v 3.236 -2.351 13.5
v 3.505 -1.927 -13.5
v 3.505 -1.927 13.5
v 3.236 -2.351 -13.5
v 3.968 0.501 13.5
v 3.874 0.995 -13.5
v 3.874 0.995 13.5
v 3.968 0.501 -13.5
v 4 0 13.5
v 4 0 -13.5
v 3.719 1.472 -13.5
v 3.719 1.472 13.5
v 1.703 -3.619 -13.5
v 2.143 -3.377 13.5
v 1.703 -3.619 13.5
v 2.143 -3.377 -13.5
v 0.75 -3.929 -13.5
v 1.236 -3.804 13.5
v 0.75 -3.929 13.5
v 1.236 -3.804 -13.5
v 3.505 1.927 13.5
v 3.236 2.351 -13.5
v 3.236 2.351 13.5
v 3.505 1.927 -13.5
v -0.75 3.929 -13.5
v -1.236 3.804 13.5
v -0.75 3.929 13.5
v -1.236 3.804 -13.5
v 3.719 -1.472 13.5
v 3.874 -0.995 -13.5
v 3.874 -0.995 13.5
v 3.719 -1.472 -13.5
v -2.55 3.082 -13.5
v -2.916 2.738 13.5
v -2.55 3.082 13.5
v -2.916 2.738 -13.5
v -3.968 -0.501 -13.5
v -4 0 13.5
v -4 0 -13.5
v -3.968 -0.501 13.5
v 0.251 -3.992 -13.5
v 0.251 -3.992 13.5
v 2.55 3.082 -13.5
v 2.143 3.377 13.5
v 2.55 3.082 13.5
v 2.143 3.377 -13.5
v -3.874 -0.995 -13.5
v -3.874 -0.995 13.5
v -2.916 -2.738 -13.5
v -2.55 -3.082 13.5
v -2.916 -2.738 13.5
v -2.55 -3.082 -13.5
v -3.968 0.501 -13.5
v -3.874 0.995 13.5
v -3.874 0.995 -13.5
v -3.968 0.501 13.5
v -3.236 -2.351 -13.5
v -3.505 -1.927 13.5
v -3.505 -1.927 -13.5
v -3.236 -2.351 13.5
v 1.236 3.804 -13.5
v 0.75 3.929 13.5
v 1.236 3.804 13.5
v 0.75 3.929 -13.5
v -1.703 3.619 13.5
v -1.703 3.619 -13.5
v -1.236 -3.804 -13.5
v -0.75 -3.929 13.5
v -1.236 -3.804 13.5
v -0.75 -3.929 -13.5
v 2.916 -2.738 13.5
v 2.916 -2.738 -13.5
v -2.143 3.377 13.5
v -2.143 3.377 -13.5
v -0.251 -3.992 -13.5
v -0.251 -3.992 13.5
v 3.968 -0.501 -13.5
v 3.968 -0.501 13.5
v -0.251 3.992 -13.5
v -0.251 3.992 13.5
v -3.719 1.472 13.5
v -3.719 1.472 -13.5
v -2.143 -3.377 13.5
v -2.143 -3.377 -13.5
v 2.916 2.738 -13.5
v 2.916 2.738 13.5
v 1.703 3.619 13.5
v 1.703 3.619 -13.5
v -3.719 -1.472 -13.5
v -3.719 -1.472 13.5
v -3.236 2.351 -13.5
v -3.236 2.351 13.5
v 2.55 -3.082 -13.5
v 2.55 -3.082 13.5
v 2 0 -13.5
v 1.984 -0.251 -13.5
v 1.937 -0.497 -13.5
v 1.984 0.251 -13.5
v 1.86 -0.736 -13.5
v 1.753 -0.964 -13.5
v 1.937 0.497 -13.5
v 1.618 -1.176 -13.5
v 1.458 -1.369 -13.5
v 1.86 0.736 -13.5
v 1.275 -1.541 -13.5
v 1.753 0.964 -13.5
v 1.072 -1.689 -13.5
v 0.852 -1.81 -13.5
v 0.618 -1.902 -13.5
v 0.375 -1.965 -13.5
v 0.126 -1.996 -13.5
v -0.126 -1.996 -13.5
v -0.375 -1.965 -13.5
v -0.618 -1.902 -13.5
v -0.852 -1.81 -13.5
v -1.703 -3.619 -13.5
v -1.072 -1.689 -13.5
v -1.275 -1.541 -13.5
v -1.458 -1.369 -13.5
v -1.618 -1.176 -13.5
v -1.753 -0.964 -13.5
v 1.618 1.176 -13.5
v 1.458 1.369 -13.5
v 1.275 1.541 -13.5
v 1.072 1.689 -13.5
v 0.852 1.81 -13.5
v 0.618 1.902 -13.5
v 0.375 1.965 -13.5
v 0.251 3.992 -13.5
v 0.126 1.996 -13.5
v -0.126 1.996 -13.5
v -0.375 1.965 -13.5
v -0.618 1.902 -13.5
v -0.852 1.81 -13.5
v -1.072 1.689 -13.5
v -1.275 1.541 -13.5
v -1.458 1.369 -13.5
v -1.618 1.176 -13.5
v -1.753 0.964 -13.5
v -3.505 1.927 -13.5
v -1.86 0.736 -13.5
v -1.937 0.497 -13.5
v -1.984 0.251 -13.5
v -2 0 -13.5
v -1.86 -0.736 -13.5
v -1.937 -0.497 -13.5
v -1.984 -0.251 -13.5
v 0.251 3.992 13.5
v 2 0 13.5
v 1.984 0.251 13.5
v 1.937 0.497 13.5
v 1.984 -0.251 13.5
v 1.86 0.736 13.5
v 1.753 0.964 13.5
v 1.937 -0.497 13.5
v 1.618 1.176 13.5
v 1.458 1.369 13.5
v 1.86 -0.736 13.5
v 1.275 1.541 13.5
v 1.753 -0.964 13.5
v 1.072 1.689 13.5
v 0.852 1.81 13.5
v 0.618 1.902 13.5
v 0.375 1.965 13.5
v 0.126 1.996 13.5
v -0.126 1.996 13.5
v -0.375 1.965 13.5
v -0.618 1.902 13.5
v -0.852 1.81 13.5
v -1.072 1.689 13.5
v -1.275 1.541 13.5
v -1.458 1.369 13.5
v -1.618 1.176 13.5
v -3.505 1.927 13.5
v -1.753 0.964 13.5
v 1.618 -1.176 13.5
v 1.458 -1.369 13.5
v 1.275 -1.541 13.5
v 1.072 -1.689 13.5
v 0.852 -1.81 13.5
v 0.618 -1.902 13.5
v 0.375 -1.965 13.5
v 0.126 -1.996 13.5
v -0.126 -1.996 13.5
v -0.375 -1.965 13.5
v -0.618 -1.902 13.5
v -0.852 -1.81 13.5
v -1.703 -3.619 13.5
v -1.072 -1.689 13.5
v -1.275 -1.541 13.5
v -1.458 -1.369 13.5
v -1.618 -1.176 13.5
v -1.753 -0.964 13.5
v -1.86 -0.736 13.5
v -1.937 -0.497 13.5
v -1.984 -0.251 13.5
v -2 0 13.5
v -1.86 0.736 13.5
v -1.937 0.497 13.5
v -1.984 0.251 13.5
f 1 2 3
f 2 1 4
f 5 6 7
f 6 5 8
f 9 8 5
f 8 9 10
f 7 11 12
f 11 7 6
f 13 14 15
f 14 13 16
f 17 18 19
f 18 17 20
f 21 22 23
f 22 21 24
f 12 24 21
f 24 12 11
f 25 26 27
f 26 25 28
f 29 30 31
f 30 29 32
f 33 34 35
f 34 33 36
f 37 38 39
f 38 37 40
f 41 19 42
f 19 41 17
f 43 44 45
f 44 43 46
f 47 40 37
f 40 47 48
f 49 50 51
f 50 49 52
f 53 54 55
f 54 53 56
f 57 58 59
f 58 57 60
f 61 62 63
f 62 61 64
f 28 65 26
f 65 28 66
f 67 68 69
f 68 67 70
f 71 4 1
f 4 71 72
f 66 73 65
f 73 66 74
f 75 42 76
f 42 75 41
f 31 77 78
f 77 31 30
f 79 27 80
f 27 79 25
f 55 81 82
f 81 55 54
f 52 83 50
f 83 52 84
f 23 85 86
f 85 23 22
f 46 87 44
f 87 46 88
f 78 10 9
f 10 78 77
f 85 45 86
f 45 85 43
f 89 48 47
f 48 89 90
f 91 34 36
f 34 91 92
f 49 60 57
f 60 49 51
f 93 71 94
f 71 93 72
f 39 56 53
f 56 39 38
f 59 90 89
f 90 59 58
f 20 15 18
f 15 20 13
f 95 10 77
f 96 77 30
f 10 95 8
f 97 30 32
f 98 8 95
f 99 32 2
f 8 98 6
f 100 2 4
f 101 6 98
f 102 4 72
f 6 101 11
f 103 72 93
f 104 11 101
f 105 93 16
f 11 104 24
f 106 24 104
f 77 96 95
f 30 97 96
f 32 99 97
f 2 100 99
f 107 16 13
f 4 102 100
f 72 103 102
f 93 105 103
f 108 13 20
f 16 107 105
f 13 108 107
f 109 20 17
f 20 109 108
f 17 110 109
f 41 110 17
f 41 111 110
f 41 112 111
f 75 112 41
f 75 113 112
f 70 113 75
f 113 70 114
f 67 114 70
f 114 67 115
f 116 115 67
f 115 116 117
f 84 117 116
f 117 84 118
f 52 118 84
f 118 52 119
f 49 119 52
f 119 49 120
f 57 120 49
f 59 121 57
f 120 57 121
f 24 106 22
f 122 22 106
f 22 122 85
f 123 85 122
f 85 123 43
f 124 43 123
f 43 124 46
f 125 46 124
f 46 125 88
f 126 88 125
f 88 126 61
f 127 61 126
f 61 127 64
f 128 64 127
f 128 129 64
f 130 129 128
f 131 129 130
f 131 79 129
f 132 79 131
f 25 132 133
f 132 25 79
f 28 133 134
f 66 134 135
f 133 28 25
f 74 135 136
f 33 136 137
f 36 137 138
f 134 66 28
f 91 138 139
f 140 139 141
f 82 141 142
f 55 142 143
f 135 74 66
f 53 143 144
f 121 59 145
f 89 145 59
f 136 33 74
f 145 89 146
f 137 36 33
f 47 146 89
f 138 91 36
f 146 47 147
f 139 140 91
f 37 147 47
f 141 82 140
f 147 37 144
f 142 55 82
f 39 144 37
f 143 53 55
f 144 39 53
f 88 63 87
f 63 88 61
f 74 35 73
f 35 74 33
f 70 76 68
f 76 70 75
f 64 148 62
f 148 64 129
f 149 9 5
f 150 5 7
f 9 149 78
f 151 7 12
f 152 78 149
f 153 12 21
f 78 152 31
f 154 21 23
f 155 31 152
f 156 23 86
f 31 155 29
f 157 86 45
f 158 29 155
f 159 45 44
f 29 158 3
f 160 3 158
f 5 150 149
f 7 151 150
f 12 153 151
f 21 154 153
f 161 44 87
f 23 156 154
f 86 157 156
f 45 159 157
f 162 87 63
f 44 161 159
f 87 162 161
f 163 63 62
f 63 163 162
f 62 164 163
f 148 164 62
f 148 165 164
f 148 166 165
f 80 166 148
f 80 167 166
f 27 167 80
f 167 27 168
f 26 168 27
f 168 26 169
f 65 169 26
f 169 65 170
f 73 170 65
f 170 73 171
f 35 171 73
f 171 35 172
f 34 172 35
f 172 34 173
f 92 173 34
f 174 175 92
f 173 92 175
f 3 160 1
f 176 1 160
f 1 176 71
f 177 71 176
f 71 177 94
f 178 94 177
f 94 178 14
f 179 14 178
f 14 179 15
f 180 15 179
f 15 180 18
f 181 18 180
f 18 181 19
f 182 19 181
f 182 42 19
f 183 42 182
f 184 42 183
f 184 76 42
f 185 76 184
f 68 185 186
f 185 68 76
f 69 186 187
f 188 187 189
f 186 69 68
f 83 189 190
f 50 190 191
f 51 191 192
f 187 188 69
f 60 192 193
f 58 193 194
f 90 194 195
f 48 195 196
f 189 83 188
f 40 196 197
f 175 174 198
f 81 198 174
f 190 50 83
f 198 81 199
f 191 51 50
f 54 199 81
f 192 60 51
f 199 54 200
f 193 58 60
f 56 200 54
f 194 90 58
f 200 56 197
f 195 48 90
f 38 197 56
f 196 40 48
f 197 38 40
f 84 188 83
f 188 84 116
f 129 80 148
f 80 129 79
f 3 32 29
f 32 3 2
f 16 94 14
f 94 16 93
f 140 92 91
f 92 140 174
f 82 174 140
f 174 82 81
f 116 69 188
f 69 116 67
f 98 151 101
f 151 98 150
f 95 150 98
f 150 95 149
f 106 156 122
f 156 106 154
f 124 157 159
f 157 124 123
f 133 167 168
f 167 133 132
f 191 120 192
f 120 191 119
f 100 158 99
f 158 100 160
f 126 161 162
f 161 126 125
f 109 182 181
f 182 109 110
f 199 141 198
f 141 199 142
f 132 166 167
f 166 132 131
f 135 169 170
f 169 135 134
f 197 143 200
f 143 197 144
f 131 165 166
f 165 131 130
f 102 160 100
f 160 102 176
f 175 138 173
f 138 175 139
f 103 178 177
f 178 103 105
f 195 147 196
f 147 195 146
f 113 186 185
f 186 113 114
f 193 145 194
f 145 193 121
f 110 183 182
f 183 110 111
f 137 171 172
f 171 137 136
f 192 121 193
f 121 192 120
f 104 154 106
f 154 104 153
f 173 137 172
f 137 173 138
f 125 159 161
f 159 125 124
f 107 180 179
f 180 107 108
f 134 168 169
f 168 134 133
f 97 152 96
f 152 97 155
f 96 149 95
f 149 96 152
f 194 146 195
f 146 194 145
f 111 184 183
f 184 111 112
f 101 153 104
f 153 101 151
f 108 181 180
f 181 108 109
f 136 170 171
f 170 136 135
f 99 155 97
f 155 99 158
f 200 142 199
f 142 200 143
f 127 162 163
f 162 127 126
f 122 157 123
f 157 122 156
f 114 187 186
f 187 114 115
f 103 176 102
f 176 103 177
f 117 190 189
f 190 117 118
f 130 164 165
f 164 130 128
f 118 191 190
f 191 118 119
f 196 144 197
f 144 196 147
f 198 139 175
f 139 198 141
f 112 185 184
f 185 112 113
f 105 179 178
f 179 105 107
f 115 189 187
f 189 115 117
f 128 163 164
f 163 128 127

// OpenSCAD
$fn = 50;


difference() {
	union() {
		translate(v = [0, 0, -13.5000000000]) {
			cylinder(h = 27, r = 4.0000000000);
		}
	}
	union() {
		translate(v = [0, 0, -100.0000000000]) {
			cylinder(h = 200, r = 2.0000000000);
		}
	}
}
